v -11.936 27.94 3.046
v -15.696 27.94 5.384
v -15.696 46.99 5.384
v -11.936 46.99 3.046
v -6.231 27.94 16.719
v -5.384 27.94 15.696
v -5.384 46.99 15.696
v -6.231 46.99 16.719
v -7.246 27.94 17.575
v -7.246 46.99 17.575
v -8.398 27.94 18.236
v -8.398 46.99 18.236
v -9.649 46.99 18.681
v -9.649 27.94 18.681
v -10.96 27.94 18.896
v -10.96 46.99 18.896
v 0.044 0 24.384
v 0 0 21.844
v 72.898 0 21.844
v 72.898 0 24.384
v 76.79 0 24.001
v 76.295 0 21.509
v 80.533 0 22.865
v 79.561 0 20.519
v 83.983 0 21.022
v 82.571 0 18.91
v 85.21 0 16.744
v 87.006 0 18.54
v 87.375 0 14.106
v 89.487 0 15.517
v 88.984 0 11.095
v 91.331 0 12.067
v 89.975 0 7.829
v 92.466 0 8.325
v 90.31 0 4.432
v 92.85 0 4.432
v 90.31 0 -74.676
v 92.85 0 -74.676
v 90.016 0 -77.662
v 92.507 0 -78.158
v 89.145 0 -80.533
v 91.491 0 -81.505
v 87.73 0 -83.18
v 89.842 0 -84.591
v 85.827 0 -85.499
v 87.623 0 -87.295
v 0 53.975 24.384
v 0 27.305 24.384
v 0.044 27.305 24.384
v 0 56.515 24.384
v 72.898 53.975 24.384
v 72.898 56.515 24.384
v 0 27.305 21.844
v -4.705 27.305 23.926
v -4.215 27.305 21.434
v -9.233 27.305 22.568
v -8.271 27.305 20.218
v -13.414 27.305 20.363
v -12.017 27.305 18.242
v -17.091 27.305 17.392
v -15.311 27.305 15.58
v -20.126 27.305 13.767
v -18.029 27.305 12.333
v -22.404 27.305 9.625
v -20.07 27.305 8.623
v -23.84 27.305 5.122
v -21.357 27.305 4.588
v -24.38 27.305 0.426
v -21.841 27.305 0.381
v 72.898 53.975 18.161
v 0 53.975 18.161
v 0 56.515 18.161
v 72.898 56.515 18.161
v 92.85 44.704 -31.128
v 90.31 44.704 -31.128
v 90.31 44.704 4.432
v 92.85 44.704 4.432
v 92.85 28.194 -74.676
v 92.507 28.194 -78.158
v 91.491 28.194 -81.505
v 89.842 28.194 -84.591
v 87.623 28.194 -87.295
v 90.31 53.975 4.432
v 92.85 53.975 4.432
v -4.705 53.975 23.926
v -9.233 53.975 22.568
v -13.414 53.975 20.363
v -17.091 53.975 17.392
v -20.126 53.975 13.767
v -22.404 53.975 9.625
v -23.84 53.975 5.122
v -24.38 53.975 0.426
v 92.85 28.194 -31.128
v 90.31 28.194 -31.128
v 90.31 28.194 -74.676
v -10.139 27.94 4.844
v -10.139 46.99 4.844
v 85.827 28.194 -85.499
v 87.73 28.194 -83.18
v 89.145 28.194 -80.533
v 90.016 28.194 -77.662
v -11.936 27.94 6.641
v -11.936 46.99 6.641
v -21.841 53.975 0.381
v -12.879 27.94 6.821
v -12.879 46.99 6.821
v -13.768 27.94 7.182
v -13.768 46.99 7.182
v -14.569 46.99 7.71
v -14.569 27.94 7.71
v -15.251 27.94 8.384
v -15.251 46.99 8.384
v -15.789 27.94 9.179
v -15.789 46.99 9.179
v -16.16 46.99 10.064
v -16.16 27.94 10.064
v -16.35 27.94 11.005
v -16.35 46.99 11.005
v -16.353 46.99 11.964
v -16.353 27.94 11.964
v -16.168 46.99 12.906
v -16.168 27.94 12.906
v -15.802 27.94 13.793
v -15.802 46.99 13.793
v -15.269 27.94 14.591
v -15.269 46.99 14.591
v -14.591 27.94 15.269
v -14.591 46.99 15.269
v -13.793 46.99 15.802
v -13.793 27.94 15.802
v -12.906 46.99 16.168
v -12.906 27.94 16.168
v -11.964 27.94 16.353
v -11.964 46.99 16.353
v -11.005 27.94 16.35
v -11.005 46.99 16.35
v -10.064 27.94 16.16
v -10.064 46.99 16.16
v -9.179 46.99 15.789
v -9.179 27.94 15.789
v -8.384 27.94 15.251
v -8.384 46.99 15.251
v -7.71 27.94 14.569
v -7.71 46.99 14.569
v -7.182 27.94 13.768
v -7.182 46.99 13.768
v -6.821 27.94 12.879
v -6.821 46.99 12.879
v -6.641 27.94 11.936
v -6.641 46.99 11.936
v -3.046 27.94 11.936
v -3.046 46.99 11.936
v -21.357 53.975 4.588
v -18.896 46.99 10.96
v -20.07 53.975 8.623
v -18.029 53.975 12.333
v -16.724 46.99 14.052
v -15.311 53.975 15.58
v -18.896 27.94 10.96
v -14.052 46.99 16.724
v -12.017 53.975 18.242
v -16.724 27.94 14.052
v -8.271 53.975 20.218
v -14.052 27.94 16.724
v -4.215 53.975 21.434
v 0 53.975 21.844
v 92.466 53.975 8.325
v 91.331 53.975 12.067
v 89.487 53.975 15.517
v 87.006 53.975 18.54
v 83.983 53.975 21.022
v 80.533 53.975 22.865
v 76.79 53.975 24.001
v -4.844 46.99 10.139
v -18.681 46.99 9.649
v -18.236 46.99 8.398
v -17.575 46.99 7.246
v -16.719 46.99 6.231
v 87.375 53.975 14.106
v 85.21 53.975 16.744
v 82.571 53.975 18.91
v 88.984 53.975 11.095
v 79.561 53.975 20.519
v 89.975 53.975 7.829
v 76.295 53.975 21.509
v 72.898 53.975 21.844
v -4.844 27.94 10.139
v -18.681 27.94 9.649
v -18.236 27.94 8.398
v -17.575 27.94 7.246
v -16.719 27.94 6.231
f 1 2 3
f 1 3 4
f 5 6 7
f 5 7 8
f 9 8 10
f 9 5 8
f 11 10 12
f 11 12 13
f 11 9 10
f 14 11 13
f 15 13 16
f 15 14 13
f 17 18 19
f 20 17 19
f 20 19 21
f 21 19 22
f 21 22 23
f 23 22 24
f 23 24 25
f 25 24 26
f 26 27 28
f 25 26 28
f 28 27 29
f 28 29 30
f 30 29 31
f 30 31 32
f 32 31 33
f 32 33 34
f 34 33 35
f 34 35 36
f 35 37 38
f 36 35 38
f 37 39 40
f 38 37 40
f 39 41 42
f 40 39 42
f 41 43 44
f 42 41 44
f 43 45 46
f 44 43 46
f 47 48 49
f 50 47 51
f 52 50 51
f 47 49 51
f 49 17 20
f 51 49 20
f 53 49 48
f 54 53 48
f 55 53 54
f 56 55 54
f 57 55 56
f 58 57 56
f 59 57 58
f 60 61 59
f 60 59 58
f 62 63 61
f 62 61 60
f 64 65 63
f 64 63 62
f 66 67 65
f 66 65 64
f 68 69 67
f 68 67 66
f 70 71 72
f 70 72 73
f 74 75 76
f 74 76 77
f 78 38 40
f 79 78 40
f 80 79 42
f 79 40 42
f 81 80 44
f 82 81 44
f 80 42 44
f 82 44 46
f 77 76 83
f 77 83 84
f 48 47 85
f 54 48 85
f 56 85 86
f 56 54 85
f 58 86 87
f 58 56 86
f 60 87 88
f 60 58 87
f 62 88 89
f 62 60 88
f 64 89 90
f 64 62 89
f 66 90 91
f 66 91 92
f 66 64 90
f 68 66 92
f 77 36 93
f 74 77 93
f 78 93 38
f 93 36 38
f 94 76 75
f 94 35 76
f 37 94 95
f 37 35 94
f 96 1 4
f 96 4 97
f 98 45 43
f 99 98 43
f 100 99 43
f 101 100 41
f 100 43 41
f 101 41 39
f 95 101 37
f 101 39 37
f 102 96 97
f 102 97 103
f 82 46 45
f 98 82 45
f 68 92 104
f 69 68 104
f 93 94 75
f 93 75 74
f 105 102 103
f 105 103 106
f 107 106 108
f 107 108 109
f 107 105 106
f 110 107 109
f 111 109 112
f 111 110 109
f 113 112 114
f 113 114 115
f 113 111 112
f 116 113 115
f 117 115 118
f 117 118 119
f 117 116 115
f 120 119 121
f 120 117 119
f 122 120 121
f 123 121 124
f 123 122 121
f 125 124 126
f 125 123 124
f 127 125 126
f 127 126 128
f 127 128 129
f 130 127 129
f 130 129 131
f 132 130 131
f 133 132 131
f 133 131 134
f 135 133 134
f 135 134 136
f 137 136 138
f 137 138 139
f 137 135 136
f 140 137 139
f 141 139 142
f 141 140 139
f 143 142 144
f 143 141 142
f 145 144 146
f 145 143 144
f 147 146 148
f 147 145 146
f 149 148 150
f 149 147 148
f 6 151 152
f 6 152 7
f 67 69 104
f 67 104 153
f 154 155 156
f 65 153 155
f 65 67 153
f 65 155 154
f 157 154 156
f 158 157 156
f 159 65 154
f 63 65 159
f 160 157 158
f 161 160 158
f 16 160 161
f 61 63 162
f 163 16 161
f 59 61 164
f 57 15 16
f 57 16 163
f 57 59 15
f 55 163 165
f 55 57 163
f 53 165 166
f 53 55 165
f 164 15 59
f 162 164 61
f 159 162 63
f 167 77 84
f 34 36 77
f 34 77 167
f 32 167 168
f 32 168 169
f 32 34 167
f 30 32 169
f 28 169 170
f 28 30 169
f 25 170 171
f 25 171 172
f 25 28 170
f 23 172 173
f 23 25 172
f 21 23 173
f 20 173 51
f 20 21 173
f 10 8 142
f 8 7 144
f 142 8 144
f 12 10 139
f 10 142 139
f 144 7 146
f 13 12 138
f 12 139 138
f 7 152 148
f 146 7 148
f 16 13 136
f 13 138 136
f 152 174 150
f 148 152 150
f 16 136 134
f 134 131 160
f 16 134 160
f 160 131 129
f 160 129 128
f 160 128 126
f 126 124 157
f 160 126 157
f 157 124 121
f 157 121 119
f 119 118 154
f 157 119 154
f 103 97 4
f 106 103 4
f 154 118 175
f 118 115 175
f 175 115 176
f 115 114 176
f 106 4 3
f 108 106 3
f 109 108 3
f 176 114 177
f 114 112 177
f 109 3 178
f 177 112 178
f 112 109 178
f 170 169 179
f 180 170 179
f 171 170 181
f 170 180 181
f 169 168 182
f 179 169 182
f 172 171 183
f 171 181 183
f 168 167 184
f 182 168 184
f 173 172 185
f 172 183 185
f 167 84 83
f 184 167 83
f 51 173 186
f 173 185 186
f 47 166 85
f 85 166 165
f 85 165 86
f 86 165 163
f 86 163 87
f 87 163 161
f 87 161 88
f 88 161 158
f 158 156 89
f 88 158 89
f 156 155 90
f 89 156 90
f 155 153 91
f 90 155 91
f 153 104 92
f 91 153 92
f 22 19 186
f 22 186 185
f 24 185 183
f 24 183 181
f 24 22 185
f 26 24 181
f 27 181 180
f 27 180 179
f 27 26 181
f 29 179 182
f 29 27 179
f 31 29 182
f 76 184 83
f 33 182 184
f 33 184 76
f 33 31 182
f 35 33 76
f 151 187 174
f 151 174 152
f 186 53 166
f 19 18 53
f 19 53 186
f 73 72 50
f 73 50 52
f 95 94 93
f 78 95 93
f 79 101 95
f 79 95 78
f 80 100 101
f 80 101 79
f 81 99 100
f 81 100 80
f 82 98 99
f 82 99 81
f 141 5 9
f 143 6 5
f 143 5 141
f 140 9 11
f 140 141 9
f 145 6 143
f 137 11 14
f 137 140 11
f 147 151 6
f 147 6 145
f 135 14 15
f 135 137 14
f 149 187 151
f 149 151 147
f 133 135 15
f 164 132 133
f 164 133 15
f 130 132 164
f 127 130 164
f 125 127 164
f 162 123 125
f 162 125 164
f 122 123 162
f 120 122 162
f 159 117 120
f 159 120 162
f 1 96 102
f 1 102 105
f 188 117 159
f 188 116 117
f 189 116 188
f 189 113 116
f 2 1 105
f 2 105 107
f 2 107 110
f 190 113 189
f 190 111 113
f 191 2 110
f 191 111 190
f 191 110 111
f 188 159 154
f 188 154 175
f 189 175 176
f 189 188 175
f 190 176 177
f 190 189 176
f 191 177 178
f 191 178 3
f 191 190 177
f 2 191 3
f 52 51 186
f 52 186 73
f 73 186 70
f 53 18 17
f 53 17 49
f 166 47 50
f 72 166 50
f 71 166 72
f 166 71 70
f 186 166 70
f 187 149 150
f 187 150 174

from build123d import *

# Parameters (mm, degrees)
EXTRUDE_THIN1_DEPTH = 53.975
BOSS_EXTRUDE1_START = 27.94
BOSS_EXTRUDE1_DEPTH = 19.05
BOSS_EXTRUDE2_DEPTH = 28.194
SKETCH12_W          = 34.867415814
SKETCH12_H          = 30.773507234
CUT_EXTRUDE1_DEPTH  = 27.000736901
SKETCH13_W          = 2.54
SKETCH13_H          = 35.56
BOSS_EXTRUDE3_DEPTH = 16.51
SKETCH14_W          = 72.898
SKETCH14_H          = 6.223180908
BOSS_EXTRUDE4_DEPTH = 2.54


with BuildPart() as part:
    # Sketch8 → Extrude-Thin1 (new body)
    with BuildSketch(Plane(origin=(0, 0, 0), x_dir=(1, 0, 0), z_dir=(0, 1, 0))):
        with BuildLine():
            ThreePointArc((-21.840673053, -0.381230366), (-15.310661969, -15.580242811), (0, -21.844))
            Line((0, -21.844), (72.898, -21.844))
            ThreePointArc((72.898, -21.844), (85.209931142, -16.744231142), (90.3097, -4.4323))
            Line((90.3097, -4.4323), (92.8497, -4.4323))
            ThreePointArc((92.8497, -4.4323), (87.005982366, -18.540282366), (72.898, -24.384))
            Line((72.898, -24.384), (0, -24.384))
            ThreePointArc((0, -24.384), (-17.090971501, -17.391898952), (-24.380286199, -0.425559479))
            Line((-24.380286199, -0.425559479), (-21.840673053, -0.381230366))
        make_face()
    extrude(amount=EXTRUDE_THIN1_DEPTH)

    # Sketch10 → Boss-Extrude1 (add)
    with BuildSketch(Plane(origin=(0, 0, 0), x_dir=(1, 0, 0), z_dir=(0, 1, 0)).offset(BOSS_EXTRUDE1_START)):
        with BuildLine():
            Line((-6.641231784, -11.936352934), (-4.843541474, -10.138662625))
            Line((-4.843541474, -10.138662625), (-3.045851165, -11.936352934))
            Line((-3.045851165, -11.936352934), (-5.383859486, -15.696211745))
            ThreePointArc((-5.383859486, -15.696211745), (-7.807213542, -17.931410627), (-10.959862847, -18.895548216))
            ThreePointArc((-10.959862847, -18.895548216), (-15.446040528, -15.446040528), (-18.895548216, -10.959862847))
            ThreePointArc((-18.895548216, -10.959862847), (-17.931410627, -7.807213542), (-15.696211745, -5.383859486))
            Line((-15.696211745, -5.383859486), (-11.936352934, -3.045851165))
            Line((-11.936352934, -3.045851165), (-10.138662625, -4.843541474))
            Line((-10.138662625, -4.843541474), (-11.936352934, -6.641231784))
            ThreePointArc((-11.936352934, -6.641231784), (-14.946738288, -14.946738288), (-6.641231784, -11.936352934))
        make_face()
    extrude(amount=BOSS_EXTRUDE1_DEPTH)

    # Sketch11 → Boss-Extrude2 (add)
    with BuildSketch(Plane(origin=(0, 0, 0), x_dir=(1, 0, 0), z_dir=(0, 1, 0))):
        with BuildLine():
            Line((90.3097, -4.4323), (92.8497, -4.4323))
            Line((92.8497, -4.4323), (92.8497, 74.676))
            ThreePointArc((92.8497, 74.676), (91.491251092, 81.505383841), (87.622715901, 87.295055901))
            Line((87.622715901, 87.295055901), (85.826664677, 85.499004677))
            ThreePointArc((85.826664677, 85.499004677), (89.14459708, 80.533367923), (90.3097, 74.676))
            Line((90.3097, 74.676), (90.3097, -4.4323))
        make_face()
    extrude(amount=BOSS_EXTRUDE2_DEPTH)

    # Sketch12 → Cut-Extrude1 (cut, through all)
    with BuildSketch(Plane(origin=(0, 0, 0), x_dir=(-0.999847695, 0, 0.017452406), z_dir=(-0.017452406, 0, -0.999847695))):
        with Locations((17.814938273, 11.918246383)):
            Rectangle(SKETCH12_W, SKETCH12_H)
    extrude(amount=-CUT_EXTRUDE1_DEPTH, mode=Mode.SUBTRACT)

    # Sketch13 → Boss-Extrude3 (add)
    with BuildSketch(Plane(origin=(0, 28.194, 0), x_dir=(1, 0, 0), z_dir=(0, 1, 0))):
        with Locations((91.5797, 13.3477)):
            Rectangle(SKETCH13_W, SKETCH13_H)
    extrude(amount=BOSS_EXTRUDE3_DEPTH)

    # Sketch14 → Boss-Extrude4 (add)
    with BuildSketch(Plane(origin=(0, 53.975, 0), x_dir=(1, 0, 0), z_dir=(0, 1, 0))):
        with Locations((36.449, -21.272409546)):
            Rectangle(SKETCH14_W, SKETCH14_H)
    extrude(amount=BOSS_EXTRUDE4_DEPTH)


solid = part.part
